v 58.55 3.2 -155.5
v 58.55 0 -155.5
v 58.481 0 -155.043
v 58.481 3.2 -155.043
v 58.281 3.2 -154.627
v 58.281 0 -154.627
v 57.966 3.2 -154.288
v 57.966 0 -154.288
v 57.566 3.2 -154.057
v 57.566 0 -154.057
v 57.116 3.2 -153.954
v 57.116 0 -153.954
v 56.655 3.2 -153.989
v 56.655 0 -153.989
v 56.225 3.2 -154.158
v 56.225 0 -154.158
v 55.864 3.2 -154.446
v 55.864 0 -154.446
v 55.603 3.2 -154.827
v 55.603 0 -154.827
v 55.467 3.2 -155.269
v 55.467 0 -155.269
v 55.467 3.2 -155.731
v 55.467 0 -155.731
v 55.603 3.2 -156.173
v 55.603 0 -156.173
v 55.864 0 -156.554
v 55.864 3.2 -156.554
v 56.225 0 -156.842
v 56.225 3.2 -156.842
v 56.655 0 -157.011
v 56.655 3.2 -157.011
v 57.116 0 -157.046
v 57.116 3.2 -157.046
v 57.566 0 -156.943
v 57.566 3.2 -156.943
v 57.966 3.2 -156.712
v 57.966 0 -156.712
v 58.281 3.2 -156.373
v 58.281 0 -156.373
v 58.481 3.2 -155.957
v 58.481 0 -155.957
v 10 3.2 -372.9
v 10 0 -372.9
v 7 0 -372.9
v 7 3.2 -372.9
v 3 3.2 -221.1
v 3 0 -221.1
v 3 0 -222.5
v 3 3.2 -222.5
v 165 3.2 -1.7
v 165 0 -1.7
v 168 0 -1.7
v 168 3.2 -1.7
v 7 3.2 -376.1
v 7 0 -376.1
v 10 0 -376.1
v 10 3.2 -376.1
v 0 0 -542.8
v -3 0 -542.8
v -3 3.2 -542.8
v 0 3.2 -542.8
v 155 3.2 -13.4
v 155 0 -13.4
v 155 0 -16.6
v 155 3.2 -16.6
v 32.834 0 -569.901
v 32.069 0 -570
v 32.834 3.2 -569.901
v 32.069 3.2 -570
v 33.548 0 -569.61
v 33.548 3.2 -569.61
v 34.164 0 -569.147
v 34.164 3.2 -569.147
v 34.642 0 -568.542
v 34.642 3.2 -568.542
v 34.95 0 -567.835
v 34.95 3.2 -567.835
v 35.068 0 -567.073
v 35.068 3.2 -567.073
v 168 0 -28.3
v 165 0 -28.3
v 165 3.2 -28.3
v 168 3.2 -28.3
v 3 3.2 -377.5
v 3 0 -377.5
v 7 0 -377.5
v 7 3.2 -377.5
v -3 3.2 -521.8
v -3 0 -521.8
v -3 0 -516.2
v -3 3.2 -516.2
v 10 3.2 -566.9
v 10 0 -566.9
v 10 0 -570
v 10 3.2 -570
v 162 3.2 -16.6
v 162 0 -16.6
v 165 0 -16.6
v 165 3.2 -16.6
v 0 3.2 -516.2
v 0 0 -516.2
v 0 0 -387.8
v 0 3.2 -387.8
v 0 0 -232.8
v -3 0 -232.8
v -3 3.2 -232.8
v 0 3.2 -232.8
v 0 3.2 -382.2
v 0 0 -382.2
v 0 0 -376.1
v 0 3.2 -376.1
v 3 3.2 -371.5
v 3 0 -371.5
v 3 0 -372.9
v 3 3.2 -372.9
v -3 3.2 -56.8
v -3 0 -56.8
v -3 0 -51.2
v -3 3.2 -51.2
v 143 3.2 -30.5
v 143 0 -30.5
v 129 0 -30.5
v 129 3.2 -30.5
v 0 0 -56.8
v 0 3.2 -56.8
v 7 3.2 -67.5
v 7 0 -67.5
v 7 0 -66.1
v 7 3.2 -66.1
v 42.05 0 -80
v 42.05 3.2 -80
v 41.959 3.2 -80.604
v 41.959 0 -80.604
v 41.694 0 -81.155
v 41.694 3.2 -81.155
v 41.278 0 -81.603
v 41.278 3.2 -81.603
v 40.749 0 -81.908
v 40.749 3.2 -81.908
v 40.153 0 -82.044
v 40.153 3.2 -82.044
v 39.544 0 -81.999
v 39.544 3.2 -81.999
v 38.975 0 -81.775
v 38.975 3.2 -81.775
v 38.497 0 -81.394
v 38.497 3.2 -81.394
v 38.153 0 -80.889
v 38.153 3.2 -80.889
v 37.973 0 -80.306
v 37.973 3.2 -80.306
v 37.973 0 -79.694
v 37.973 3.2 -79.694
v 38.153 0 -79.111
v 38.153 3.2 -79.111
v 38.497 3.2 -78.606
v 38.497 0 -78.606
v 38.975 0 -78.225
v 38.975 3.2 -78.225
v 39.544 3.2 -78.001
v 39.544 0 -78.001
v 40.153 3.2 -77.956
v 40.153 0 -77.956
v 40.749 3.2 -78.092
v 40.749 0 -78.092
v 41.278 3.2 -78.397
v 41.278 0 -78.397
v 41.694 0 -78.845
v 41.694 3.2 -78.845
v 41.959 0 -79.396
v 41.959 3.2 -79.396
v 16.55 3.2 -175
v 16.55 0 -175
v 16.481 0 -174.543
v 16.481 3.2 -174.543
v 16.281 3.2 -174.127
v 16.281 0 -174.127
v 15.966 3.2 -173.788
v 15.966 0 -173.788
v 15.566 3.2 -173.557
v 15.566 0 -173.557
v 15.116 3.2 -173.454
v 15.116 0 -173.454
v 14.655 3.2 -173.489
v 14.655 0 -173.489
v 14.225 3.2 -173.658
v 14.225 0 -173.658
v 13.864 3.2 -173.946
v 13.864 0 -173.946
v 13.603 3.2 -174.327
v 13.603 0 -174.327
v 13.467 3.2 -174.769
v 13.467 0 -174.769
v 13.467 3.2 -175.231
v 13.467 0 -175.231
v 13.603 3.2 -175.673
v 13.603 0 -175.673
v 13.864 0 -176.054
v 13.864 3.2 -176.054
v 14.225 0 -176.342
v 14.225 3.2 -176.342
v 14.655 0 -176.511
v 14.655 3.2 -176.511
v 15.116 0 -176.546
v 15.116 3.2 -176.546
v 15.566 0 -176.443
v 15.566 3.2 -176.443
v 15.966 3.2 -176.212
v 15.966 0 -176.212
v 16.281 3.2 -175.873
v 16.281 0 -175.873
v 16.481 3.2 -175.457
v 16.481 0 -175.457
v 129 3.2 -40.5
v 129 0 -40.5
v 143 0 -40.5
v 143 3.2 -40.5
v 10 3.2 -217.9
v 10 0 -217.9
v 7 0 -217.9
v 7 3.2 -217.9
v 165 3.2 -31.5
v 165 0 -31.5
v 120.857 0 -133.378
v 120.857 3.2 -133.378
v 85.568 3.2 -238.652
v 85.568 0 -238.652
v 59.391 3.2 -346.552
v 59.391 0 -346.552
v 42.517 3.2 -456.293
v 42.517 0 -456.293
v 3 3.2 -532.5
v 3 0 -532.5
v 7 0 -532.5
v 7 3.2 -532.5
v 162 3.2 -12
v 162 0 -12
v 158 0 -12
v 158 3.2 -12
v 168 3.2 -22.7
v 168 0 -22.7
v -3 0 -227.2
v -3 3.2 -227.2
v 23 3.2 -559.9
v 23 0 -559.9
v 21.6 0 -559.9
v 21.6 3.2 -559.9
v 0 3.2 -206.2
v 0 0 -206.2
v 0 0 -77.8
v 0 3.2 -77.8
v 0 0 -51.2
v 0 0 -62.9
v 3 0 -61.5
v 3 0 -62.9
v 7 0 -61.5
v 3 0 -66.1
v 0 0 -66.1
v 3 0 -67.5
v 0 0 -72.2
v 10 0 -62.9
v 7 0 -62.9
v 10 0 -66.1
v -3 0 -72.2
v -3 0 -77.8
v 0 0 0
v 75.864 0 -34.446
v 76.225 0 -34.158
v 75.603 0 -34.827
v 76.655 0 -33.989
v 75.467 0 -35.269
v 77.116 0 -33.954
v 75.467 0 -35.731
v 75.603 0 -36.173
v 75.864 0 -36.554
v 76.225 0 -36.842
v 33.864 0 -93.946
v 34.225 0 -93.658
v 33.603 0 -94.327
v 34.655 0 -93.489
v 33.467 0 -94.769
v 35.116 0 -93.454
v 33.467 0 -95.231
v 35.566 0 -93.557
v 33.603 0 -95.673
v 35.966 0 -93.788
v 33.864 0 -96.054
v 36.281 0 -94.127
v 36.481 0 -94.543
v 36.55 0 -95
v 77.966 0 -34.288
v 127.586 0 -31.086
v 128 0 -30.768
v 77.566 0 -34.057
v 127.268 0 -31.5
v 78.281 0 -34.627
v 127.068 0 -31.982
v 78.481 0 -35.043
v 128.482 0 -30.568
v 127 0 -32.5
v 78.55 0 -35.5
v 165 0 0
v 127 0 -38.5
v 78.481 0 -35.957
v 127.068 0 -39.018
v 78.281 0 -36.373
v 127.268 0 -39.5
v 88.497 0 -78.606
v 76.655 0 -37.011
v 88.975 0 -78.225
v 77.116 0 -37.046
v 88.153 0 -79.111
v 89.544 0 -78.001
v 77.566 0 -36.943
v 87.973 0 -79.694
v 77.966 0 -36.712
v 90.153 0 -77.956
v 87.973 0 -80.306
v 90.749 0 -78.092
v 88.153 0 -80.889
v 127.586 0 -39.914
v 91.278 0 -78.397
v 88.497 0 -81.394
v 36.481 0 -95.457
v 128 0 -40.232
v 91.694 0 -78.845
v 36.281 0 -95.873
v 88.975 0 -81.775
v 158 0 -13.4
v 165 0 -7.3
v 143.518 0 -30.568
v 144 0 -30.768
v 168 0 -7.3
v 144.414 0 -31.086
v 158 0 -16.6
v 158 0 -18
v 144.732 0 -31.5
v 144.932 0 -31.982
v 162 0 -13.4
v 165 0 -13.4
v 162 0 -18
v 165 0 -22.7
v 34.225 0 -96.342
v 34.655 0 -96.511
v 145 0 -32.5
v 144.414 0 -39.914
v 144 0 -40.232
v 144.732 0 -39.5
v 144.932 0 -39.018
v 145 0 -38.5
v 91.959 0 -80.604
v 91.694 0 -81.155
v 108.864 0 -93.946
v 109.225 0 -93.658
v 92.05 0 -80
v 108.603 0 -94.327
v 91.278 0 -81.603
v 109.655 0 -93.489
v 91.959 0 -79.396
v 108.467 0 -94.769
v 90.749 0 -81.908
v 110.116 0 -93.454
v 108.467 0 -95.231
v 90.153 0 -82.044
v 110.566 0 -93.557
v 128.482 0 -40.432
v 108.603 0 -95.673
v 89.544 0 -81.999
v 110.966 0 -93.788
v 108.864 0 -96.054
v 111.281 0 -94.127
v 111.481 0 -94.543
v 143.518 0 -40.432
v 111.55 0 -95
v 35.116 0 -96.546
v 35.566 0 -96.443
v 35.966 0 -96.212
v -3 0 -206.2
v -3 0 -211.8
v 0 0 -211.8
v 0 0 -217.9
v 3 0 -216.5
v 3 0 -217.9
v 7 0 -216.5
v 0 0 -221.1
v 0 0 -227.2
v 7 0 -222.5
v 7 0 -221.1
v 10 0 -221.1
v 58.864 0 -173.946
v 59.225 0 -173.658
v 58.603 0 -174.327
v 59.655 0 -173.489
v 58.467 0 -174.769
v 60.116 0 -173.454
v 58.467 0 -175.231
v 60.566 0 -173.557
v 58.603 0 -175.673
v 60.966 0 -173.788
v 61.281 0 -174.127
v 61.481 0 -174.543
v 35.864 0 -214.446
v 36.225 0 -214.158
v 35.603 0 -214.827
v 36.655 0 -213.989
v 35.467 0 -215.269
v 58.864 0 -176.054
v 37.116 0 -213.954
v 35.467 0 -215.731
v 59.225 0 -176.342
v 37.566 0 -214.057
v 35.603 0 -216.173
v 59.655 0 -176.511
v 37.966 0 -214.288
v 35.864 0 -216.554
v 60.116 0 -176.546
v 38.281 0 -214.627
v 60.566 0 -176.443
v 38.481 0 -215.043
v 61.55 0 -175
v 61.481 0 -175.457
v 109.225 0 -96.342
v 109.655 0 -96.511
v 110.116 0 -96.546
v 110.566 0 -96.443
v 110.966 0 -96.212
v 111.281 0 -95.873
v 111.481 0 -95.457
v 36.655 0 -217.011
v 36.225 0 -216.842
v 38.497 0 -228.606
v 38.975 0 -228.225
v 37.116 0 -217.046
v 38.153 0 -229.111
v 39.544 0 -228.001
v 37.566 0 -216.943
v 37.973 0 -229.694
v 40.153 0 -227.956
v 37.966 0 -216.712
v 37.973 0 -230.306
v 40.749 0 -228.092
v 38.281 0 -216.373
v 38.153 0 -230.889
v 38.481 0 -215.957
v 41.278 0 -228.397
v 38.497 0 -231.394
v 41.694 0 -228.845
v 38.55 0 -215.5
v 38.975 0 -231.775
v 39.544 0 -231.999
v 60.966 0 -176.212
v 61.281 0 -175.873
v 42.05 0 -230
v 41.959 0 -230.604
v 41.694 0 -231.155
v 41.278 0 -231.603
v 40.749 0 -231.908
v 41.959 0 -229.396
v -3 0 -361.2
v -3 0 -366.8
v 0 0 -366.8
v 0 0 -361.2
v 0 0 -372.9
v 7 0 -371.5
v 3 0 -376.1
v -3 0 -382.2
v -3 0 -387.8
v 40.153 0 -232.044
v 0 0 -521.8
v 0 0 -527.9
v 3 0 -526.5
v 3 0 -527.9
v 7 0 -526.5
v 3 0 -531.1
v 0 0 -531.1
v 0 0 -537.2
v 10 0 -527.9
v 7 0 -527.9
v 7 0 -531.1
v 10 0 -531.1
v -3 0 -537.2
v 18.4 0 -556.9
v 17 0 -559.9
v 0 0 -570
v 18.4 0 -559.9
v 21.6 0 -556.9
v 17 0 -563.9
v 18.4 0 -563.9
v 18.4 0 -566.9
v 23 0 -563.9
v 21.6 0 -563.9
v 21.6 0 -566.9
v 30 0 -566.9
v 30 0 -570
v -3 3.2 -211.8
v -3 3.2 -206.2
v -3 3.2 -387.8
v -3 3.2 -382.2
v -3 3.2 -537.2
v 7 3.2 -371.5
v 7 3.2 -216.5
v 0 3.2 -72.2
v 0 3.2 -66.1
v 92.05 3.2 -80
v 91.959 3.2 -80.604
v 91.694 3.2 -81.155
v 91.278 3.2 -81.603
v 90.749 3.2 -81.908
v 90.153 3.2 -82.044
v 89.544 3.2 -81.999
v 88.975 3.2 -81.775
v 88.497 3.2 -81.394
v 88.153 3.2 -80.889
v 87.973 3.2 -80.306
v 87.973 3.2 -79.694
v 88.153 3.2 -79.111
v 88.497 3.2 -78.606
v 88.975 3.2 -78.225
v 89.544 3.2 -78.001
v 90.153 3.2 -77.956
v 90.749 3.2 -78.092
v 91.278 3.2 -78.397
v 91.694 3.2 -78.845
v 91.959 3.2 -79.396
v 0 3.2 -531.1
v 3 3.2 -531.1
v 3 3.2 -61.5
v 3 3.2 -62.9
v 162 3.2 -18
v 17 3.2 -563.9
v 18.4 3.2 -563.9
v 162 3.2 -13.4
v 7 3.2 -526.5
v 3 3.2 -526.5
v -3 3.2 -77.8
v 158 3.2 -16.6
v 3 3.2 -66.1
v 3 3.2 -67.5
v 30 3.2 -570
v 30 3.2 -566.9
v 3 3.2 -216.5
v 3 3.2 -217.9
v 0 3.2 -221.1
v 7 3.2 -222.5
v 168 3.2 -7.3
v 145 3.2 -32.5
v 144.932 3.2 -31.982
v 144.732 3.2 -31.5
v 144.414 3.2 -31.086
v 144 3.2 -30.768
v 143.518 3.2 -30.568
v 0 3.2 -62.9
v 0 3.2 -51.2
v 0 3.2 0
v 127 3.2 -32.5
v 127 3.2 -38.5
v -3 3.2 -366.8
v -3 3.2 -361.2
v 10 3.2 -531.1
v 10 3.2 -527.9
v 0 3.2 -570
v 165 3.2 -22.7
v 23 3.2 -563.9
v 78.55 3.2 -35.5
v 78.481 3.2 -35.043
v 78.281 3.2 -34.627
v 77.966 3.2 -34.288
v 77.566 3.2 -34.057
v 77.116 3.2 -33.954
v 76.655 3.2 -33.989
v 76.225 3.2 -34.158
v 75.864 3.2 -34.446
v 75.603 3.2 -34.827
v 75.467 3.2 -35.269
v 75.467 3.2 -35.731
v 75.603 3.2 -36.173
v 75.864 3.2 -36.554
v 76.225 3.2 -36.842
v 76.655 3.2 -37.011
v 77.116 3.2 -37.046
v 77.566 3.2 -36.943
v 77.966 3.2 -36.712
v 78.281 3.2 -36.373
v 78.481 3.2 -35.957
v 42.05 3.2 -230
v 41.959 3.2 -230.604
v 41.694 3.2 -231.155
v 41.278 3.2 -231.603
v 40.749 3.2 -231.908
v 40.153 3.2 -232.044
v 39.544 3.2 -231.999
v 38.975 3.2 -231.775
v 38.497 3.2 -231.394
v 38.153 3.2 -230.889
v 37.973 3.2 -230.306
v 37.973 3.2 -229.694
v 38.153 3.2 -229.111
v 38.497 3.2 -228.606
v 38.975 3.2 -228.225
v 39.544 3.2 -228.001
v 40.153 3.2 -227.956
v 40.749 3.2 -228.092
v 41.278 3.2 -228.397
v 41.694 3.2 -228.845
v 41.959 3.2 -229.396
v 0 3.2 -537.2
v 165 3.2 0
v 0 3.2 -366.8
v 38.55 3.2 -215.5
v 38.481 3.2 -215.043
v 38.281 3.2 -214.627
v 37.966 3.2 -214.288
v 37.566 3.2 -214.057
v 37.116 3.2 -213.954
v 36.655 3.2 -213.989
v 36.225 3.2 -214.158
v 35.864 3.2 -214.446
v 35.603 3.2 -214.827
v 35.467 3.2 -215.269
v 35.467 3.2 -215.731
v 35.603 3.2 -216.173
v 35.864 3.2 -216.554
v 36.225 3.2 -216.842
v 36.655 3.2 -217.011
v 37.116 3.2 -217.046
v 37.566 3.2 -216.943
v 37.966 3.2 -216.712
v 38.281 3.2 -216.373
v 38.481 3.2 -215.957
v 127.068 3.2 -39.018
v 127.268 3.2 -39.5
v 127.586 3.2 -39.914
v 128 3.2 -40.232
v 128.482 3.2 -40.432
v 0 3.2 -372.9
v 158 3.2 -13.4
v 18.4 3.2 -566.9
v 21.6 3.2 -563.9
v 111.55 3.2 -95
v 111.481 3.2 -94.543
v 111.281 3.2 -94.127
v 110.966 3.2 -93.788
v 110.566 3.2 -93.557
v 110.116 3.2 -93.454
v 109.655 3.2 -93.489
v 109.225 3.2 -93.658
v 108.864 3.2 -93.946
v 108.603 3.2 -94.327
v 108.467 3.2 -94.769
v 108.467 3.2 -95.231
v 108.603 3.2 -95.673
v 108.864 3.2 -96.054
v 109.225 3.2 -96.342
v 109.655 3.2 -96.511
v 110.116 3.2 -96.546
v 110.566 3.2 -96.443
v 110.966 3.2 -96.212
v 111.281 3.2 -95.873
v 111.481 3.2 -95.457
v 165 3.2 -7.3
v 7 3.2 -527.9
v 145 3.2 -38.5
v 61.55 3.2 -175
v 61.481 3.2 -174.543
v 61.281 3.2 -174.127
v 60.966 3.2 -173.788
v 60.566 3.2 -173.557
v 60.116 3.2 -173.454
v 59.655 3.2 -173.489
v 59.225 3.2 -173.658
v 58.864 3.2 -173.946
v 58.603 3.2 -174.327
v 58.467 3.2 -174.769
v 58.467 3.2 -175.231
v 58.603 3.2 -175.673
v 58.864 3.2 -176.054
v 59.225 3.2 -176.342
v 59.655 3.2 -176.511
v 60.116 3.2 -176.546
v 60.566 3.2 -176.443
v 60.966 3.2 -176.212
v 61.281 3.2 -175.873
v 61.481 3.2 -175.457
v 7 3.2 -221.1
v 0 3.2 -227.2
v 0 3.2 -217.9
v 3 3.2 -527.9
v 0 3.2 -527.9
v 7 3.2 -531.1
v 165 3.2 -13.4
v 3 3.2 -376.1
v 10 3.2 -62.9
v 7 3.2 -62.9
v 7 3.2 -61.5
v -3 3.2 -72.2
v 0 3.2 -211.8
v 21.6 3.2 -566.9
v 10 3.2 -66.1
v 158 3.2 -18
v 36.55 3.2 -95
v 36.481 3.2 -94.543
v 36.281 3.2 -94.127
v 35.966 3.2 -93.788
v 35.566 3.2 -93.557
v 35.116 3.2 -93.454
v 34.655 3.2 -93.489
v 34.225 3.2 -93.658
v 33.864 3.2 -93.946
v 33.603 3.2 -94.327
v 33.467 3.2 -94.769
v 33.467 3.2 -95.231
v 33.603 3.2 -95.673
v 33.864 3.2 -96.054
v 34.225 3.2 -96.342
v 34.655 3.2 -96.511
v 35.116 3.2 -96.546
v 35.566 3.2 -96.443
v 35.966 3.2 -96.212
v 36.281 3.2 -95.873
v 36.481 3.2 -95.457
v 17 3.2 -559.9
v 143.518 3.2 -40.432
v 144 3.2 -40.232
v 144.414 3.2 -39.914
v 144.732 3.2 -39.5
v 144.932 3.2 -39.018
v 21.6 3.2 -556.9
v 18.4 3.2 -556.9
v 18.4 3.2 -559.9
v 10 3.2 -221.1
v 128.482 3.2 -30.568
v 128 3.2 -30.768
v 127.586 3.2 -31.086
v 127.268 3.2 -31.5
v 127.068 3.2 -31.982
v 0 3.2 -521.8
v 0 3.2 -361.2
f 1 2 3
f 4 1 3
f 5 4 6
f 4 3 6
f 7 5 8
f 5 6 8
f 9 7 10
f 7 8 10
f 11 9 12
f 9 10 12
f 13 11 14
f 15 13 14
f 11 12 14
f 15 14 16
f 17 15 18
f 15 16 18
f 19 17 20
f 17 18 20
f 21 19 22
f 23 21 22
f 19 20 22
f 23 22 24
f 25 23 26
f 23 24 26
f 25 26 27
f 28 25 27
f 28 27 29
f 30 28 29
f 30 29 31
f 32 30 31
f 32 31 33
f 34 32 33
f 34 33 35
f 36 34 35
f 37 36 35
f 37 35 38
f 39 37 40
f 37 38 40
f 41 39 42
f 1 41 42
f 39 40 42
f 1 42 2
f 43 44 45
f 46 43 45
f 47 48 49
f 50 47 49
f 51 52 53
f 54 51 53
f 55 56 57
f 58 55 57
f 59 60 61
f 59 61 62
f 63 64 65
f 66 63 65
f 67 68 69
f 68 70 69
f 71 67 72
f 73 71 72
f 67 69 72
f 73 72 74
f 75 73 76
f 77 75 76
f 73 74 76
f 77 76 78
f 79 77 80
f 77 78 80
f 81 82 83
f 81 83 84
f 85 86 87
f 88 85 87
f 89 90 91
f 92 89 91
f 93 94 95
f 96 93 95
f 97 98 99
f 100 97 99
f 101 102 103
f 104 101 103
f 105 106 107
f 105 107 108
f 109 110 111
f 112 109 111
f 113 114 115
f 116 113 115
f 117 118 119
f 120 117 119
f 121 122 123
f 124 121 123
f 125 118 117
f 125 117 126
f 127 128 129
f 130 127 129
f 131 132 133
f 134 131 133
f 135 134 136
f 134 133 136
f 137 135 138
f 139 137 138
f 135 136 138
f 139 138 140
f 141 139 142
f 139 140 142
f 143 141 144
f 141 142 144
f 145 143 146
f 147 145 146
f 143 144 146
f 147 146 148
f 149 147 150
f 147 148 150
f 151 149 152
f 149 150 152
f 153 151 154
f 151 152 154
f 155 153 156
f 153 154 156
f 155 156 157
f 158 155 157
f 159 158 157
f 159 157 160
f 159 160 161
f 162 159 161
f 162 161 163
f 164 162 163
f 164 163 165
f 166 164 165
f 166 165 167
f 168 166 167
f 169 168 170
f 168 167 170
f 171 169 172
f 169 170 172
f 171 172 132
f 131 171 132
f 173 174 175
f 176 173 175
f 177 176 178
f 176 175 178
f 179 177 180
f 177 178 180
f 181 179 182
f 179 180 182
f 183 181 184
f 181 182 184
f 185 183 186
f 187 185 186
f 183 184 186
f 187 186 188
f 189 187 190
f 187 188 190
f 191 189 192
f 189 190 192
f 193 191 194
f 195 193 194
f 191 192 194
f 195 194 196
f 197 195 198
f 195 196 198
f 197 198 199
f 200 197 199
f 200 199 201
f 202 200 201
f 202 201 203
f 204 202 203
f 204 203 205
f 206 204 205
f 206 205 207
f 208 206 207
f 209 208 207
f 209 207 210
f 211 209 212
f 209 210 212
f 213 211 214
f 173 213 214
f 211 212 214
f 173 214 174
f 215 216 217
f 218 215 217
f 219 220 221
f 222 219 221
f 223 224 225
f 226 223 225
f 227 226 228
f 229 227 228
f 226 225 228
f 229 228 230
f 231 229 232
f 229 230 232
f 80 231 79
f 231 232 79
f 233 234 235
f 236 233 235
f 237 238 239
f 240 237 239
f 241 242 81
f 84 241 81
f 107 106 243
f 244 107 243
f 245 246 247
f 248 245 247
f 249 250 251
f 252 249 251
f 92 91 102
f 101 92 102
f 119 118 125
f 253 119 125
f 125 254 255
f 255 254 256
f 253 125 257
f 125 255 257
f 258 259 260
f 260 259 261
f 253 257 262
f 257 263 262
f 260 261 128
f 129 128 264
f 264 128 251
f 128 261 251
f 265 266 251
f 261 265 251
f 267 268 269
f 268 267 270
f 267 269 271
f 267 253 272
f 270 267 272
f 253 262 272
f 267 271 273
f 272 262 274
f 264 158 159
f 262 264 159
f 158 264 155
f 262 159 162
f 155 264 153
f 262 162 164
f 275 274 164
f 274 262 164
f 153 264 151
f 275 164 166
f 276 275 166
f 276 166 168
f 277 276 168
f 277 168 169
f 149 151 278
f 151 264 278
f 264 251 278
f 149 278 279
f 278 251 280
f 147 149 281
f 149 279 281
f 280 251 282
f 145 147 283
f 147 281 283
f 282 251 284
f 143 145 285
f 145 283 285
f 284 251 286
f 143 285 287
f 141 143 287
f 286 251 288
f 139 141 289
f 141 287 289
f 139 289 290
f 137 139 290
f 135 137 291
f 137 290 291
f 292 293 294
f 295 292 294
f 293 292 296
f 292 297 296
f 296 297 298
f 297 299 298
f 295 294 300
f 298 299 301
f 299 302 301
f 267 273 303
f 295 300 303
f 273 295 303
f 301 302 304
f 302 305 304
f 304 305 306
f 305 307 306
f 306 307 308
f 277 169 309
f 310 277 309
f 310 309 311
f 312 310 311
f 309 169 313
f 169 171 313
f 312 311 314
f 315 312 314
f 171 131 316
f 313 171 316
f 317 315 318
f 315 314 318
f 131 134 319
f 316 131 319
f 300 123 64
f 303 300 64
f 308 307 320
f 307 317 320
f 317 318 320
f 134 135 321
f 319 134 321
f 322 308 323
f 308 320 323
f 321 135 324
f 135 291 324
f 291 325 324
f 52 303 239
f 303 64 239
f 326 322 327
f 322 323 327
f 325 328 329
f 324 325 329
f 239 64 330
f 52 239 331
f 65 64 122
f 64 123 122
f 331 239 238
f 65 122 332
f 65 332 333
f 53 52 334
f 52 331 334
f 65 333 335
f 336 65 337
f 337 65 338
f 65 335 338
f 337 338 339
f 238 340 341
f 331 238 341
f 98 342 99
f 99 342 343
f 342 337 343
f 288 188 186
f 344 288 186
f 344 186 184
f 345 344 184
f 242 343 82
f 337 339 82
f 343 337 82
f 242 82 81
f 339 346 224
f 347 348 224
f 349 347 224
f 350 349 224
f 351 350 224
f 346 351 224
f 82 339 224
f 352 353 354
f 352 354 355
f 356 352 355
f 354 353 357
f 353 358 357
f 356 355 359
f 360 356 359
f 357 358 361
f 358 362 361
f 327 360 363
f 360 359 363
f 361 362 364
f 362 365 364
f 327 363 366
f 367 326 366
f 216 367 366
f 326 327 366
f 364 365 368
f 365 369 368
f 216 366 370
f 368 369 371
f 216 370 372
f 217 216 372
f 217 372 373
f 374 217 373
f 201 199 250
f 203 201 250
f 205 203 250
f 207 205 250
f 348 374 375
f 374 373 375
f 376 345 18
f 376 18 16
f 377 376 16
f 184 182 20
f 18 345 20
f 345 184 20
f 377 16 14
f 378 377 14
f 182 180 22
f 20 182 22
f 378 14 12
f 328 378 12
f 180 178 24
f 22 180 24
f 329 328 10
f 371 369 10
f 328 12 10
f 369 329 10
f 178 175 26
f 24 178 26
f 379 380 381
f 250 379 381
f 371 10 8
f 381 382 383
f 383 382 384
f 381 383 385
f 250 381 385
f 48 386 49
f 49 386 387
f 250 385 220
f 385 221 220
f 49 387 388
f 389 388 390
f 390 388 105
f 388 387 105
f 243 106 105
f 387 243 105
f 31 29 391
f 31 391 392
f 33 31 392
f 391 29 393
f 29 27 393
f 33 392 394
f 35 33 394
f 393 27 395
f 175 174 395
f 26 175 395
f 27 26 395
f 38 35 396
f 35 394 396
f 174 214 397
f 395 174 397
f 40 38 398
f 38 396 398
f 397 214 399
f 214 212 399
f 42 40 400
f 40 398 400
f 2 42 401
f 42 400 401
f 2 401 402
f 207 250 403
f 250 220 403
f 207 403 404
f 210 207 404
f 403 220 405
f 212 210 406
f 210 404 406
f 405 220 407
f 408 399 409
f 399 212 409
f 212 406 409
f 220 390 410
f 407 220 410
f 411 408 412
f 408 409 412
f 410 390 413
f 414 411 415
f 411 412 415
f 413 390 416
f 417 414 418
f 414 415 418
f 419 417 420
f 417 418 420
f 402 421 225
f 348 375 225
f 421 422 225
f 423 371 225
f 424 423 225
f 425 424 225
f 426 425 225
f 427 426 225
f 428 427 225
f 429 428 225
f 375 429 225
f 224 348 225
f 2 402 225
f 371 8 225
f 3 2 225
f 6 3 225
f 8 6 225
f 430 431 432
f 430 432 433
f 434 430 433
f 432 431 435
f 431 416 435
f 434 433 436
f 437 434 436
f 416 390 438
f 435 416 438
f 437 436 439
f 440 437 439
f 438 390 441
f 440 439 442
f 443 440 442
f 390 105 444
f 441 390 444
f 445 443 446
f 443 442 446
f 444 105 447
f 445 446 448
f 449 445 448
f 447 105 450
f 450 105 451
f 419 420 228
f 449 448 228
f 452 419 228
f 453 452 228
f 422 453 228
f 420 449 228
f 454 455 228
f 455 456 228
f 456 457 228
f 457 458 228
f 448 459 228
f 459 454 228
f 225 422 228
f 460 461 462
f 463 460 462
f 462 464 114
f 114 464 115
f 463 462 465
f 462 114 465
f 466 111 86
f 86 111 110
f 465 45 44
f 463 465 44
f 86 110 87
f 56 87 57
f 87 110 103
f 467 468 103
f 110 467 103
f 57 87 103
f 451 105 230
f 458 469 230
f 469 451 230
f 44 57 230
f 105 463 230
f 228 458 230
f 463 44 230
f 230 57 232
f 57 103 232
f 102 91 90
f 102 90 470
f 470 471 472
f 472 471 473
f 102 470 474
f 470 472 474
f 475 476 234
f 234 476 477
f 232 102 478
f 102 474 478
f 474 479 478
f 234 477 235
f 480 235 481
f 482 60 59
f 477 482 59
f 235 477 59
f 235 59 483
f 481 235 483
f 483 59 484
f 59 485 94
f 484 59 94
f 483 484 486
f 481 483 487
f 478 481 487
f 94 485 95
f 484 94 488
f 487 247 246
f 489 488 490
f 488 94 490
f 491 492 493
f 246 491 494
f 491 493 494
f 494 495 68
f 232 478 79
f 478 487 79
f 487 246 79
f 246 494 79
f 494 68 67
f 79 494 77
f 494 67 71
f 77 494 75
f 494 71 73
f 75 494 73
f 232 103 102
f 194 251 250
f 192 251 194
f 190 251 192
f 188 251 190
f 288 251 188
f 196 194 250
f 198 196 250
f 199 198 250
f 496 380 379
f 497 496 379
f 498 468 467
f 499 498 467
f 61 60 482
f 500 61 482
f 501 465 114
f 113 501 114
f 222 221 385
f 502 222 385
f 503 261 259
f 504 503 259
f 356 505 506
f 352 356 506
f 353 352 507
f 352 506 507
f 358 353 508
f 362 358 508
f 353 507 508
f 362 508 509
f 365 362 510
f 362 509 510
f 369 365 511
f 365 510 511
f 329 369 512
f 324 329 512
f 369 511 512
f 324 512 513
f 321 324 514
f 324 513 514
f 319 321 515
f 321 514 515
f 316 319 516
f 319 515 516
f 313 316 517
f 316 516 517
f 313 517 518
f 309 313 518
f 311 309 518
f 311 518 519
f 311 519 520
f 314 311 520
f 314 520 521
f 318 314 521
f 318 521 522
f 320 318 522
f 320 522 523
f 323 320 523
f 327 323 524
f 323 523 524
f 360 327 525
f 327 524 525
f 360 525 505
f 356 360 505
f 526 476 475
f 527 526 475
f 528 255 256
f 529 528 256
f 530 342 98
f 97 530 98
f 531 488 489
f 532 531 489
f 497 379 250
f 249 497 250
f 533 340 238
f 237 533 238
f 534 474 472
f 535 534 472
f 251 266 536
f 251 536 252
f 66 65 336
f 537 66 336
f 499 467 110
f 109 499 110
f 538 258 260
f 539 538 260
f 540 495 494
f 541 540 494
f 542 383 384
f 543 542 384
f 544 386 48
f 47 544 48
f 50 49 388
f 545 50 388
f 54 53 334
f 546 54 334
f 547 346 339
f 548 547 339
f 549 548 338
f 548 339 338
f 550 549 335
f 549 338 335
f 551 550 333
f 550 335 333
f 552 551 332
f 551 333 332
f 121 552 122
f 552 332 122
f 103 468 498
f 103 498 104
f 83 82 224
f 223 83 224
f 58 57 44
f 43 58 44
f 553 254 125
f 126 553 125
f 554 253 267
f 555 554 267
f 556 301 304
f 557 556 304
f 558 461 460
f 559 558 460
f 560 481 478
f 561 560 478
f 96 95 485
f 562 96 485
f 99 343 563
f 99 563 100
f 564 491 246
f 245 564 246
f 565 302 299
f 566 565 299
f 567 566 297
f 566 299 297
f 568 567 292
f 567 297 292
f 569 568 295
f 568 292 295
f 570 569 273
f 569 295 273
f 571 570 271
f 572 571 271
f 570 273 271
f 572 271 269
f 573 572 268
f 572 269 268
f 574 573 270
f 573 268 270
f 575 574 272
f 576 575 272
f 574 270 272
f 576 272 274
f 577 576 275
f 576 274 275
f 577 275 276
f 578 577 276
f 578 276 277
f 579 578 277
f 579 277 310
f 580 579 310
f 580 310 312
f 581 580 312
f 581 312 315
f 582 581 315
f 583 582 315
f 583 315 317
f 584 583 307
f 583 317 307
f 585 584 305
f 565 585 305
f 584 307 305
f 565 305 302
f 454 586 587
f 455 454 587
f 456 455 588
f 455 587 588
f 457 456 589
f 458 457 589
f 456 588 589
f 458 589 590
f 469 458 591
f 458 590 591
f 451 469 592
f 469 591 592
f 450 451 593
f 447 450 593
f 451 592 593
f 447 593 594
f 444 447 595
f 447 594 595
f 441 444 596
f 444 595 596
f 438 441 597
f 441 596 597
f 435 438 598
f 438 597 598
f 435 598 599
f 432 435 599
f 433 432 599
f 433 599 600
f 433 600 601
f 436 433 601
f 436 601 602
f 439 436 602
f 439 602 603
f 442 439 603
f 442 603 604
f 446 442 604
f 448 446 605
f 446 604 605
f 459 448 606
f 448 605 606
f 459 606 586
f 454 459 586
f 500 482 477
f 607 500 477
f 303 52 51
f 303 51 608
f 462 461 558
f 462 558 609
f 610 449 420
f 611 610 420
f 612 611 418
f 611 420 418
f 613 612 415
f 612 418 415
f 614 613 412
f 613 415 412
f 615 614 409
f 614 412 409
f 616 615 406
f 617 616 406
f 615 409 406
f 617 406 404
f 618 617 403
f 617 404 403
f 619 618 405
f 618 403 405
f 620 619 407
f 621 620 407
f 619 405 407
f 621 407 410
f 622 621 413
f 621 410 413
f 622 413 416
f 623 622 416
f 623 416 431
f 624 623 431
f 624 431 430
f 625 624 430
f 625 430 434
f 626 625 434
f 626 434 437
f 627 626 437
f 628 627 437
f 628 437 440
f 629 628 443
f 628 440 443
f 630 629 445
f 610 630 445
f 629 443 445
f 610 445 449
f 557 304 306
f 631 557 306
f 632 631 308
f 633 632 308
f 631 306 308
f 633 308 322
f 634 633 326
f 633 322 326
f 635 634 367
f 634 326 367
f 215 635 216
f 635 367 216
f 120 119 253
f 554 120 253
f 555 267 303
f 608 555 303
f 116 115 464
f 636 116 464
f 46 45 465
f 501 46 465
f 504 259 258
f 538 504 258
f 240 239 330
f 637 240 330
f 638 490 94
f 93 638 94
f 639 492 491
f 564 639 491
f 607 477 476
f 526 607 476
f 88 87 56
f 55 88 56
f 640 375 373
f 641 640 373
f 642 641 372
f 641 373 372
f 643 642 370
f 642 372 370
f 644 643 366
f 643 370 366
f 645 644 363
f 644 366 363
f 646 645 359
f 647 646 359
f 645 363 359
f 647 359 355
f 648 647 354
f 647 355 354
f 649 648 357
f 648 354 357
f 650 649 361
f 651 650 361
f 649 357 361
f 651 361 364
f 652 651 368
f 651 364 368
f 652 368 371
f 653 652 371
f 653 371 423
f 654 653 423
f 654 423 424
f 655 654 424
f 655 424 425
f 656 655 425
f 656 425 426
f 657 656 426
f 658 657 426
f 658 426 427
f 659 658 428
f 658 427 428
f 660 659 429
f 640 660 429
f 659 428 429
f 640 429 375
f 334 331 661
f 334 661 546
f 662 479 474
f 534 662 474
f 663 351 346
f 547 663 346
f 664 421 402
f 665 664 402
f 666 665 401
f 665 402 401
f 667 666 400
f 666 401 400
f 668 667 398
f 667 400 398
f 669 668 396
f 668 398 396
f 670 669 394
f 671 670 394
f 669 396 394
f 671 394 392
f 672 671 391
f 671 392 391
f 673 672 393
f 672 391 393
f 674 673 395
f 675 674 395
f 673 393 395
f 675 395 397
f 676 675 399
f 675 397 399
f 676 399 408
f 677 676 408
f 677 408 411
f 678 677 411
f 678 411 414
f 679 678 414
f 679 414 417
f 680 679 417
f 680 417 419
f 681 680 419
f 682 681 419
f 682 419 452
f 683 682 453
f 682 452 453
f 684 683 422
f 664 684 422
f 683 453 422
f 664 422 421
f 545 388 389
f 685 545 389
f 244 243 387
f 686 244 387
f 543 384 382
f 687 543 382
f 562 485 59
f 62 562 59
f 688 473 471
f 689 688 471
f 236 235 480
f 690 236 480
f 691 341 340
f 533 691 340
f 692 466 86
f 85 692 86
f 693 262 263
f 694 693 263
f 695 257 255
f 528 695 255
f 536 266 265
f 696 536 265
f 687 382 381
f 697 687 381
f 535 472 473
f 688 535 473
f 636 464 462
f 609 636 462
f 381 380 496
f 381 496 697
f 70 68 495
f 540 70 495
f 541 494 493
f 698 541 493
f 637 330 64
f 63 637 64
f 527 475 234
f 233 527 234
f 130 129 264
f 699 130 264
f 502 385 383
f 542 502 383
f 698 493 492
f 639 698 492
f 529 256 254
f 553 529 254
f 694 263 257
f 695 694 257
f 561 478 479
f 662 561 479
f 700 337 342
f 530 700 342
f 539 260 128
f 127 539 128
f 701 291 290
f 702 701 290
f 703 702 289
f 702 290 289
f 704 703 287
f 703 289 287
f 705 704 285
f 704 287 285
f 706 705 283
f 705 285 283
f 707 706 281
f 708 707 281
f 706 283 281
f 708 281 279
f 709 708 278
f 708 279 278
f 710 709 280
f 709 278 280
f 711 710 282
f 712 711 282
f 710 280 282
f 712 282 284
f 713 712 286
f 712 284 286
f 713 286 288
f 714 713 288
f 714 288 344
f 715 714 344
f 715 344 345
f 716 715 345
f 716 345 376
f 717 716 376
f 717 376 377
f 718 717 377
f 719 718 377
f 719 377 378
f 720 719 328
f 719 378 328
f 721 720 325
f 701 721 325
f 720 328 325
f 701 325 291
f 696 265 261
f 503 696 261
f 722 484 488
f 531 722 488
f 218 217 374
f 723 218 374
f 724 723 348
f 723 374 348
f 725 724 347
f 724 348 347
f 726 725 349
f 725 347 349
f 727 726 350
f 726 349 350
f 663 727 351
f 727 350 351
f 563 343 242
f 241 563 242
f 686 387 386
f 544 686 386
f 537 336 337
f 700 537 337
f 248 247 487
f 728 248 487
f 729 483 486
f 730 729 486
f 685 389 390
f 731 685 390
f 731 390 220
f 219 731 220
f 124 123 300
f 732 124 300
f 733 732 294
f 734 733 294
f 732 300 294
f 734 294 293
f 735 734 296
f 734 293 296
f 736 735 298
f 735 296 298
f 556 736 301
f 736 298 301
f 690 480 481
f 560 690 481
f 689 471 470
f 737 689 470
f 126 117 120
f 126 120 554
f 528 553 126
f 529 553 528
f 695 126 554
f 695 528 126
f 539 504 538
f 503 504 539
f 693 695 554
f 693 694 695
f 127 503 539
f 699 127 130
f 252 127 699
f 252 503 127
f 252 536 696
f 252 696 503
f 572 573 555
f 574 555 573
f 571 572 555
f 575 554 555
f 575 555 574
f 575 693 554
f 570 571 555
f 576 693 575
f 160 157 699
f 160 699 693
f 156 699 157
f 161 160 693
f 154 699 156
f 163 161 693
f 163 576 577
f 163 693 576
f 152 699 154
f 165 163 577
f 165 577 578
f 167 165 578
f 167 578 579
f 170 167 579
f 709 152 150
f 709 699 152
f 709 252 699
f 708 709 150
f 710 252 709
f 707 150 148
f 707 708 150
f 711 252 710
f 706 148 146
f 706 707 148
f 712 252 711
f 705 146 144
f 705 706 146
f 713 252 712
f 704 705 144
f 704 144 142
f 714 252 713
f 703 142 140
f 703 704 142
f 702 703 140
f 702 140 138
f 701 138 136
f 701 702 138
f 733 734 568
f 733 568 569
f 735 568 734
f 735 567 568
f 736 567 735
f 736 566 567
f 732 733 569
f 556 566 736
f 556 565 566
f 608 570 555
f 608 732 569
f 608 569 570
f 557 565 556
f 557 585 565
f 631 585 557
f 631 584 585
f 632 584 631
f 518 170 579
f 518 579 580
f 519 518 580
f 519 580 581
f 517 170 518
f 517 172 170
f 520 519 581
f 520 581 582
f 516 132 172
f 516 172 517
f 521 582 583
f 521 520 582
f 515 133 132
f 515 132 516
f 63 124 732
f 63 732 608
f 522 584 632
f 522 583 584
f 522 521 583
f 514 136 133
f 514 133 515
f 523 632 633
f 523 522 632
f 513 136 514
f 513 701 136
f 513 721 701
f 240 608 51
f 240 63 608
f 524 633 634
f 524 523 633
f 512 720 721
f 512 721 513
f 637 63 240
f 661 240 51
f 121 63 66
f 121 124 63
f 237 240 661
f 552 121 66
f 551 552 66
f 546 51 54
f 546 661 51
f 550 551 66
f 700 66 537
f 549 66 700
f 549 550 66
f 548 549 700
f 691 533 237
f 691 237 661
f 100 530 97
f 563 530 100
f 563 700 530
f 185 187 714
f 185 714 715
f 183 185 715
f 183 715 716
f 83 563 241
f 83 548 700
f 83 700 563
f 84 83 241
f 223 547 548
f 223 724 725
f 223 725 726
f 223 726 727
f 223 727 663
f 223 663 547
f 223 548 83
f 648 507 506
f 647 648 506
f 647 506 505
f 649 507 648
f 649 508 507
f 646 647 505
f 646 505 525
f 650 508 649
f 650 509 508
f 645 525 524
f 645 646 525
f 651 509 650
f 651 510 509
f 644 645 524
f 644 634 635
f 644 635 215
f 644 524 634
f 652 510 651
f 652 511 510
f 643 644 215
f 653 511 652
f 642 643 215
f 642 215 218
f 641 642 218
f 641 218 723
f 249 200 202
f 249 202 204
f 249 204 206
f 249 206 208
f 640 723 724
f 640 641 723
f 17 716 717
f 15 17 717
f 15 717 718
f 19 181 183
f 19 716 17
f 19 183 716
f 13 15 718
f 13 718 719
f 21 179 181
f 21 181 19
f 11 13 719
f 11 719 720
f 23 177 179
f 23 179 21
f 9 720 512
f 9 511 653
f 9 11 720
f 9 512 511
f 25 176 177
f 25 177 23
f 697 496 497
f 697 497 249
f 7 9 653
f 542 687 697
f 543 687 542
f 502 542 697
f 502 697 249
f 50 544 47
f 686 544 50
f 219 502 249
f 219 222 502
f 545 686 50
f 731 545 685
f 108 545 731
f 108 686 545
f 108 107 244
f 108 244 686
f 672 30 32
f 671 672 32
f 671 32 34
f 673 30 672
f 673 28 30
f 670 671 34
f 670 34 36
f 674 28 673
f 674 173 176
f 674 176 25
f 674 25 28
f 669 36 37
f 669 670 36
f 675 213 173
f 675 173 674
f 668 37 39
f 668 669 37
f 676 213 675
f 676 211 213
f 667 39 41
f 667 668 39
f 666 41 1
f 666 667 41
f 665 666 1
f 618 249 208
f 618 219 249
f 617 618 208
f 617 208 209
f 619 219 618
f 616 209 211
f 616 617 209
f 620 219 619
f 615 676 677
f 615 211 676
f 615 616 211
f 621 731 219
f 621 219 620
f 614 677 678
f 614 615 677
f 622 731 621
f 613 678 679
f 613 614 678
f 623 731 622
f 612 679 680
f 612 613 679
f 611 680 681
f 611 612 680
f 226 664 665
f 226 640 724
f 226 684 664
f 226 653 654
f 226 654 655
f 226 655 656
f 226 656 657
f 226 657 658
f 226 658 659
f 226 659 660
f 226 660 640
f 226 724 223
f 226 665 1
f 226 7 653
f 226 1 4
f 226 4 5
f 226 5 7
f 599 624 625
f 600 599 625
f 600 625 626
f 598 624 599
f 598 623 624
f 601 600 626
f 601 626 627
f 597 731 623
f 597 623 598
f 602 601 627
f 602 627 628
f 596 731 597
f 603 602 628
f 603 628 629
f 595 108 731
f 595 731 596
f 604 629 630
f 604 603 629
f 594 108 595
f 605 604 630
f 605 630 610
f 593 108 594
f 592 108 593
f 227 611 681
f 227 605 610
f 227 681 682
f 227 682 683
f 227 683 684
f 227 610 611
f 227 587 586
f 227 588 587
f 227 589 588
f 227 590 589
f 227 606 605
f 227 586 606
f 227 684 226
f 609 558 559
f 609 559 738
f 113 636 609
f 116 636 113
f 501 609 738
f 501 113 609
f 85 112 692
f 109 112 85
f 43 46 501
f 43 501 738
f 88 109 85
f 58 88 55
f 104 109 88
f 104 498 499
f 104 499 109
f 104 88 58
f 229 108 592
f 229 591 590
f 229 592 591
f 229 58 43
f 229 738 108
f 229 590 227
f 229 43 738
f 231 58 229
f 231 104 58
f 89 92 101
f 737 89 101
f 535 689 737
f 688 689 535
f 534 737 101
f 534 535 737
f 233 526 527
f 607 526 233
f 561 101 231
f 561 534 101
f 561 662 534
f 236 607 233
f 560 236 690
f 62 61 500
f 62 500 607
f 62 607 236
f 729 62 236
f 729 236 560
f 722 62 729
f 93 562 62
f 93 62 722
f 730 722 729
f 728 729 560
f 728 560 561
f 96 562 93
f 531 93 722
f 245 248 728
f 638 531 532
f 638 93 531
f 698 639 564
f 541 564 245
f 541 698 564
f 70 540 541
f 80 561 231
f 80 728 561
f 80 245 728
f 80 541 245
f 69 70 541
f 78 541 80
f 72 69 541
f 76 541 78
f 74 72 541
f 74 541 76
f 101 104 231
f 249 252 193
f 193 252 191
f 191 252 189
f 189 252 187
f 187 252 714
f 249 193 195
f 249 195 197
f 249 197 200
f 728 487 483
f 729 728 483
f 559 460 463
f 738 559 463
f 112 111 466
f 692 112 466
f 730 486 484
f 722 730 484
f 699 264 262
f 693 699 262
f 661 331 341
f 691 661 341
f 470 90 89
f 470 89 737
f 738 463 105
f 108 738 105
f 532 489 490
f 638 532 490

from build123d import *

# Parameters (mm, degrees)
SALIENTE_EXTRUIR1_DEPTH = 3.2
CROQUIS3_R              = 2.05
CORTAR_EXTRUIR2_DEPTH   = 3.2
CORTAR_EXTRUIR3_DEPTH   = 3.2
CORTAR_EXTRUIR4_DEPTH   = 3.2
REDONDEO1_R             = 3
CROQUIS6_R              = 1.55
CORTAR_EXTRUIR5_DEPTH   = 3.2
CROQUIS7_W              = 3
CROQUIS7_H              = 0.2
CORTAR_EXTRUIR6_DEPTH   = 3.2


with BuildPart() as part:
    # Croquis1 → Saliente-Extruir1 (new body)
    with BuildSketch(Plane(origin=(0, 0, 0), x_dir=(1, 0, 0), z_dir=(0, 1, 0))):
        Polygon((7, 66.1), (10, 66.1), (10, 62.9), (7, 62.9), (7, 61.5), (3, 61.5), (3, 62.9), (0, 62.9), (0, 57), (-3, 57), (-3, 51), (0, 51), (0, 0), (165, 0), (165, 1.5), (168, 1.5), (168, 7.5), (165, 7.5), (165, 13.4), (162, 13.4), (162, 12), (158, 12), (158, 13.4), (155, 13.4), (155, 16.6), (158, 16.6), (158, 18), (162, 18), (162, 16.6), (165, 16.6), (165, 22.5), (168, 22.5), (168, 28.5), (165, 28.5), (165, 570), (30, 570), (30, 566.9), (21.6, 566.9), (21.6, 563.9), (23, 563.9), (23, 559.9), (21.6, 559.9), (21.6, 556.9), (18.4, 556.9), (18.4, 559.9), (17, 559.9), (17, 563.9), (18.4, 563.9), (18.4, 566.9), (10, 566.9), (10, 570), (0, 570), (0, 543), (-3, 543), (-3, 537), (0, 537), (0, 531.1), (3, 531.1), (3, 532.5), (7, 532.5), (7, 531.1), (10, 531.1), (10, 527.9), (7, 527.9), (7, 526.5), (3, 526.5), (3, 527.9), (0, 527.9), (0, 522), (-3, 522), (-3, 516), (0, 516), (0, 388), (-3, 388), (-3, 382), (0, 382), (0, 376.1), (3, 376.1), (3, 377.5), (7, 377.5), (7, 376.1), (10, 376.1), (10, 372.9), (7, 372.9), (7, 371.5), (3, 371.5), (3, 372.9), (0, 372.9), (0, 367), (-3, 367), (-3, 361), (0, 361), (0, 233), (-3, 233), (-3, 227), (0, 227), (0, 221.1), (3, 221.1), (3, 222.5), (7, 222.5), (7, 221.1), (10, 221.1), (10, 217.9), (7, 217.9), (7, 216.5), (3, 216.5), (3, 217.9), (0, 217.9), (0, 212), (-3, 212), (-3, 206), (0, 206), (0, 78), (-3, 78), (-3, 72), (0, 72), (0, 66.1), (3, 66.1), (3, 67.5), (7, 67.5), align=None)
    extrude(amount=SALIENTE_EXTRUIR1_DEPTH)

    # Croquis3 → Cortar-Extruir2 (cut)
    with BuildSketch(Plane(origin=(0, 3.2, 0), x_dir=(1, 0, 0), z_dir=(0, 1, 0))):
        with Locations((40, 80)):
            Circle(CROQUIS3_R)
        with Locations((90, 80)):
            Circle(CROQUIS3_R)
        with Locations((40, 230)):
            Circle(CROQUIS3_R)
    extrude(amount=-CORTAR_EXTRUIR2_DEPTH, mode=Mode.SUBTRACT)

    # Croquis4 → Cortar-Extruir3 (cut)
    with BuildSketch(Plane.XZ):
        with BuildLine():
            Line((143, -30.5), (129, -30.5))
            ThreePointArc((129, -30.5), (127.585786438, -31.085786438), (127, -32.5))
            Line((127, -32.5), (127, -38.5))
            ThreePointArc((127, -38.5), (127.585786438, -39.914213562), (129, -40.5))
            Line((129, -40.5), (143, -40.5))
            ThreePointArc((143, -40.5), (144.414213562, -39.914213562), (145, -38.5))
            Line((145, -38.5), (145, -32.5))
            ThreePointArc((145, -32.5), (144.414213562, -31.085786438), (143, -30.5))
        make_face()
    extrude(amount=-CORTAR_EXTRUIR3_DEPTH, mode=Mode.SUBTRACT)

    # Croquis5 → Cortar-Extruir4 (cut)
    with BuildSketch(Plane.XZ):
        with BuildLine():
            Line((35, -570), (165, -570))
            Line((165, -570), (165, -31.5))
            ThreePointArc((165, -31.5), (70.982951471, -293.744955787), (35, -570))
        make_face()
    extrude(amount=-CORTAR_EXTRUIR4_DEPTH, mode=Mode.SUBTRACT)

    # Redondeo1
    redondeo1_edges = [part.edges().sort_by_distance(p)[0] for p in [
        (35, 1.6, -570),
    ]]
    fillet(redondeo1_edges, radius=REDONDEO1_R)

    # Croquis6 → Cortar-Extruir5 (cut)
    with BuildSketch(Plane.XZ):
        with Locations((110, -95)):
            Circle(CROQUIS6_R)
        with Locations((35, -95)):
            Circle(CROQUIS6_R)
        with Locations((60, -175)):
            Circle(CROQUIS6_R)
        with Locations((15, -175)):
            Circle(CROQUIS6_R)
        with Locations((77, -35.5)):
            Circle(CROQUIS6_R)
        with Locations((37, -215.5)):
            Circle(CROQUIS6_R)
        with Locations((57, -155.5)):
            Circle(CROQUIS6_R)
    extrude(amount=-CORTAR_EXTRUIR5_DEPTH, mode=Mode.SUBTRACT)

    # Croquis7 → Cortar-Extruir6 (cut)
    with BuildSketch(Plane.XZ):
        with Locations((-1.5, -542.9)):
            Rectangle(CROQUIS7_W, CROQUIS7_H)
        with Locations((-1.5, -537.1)):
            Rectangle(CROQUIS7_W, CROQUIS7_H)
        with Locations((-1.5, -521.9)):
            Rectangle(CROQUIS7_W, CROQUIS7_H)
        with Locations((-1.5, -516.1)):
            Rectangle(CROQUIS7_W, CROQUIS7_H)
        with Locations((-1.5, -387.9)):
            Rectangle(CROQUIS7_W, CROQUIS7_H)
        with Locations((-1.5, -382.1)):
            Rectangle(CROQUIS7_W, CROQUIS7_H)
        with Locations((-1.5, -366.9)):
            Rectangle(CROQUIS7_W, CROQUIS7_H)
        with Locations((-1.5, -361.1)):
            Rectangle(CROQUIS7_W, CROQUIS7_H)
        with Locations((-1.5, -232.9)):
            Rectangle(CROQUIS7_W, CROQUIS7_H)
        with Locations((-1.5, -227.1)):
            Rectangle(CROQUIS7_W, CROQUIS7_H)
        with Locations((-1.5, -211.9)):
            Rectangle(CROQUIS7_W, CROQUIS7_H)
        with Locations((-1.5, -206.1)):
            Rectangle(CROQUIS7_W, CROQUIS7_H)
        with Locations((-1.5, -77.9)):
            Rectangle(CROQUIS7_W, CROQUIS7_H)
        with Locations((-1.5, -72.1)):
            Rectangle(CROQUIS7_W, CROQUIS7_H)
        with Locations((-1.5, -51.1)):
            Rectangle(CROQUIS7_W, CROQUIS7_H)
        with Locations((-1.5, -56.9)):
            Rectangle(CROQUIS7_W, CROQUIS7_H)
        with Locations((166.5, -28.4)):
            Rectangle(CROQUIS7_W, CROQUIS7_H)
        with Locations((166.5, -22.6)):
            Rectangle(CROQUIS7_W, CROQUIS7_H)
        with Locations((166.5, -7.4)):
            Rectangle(CROQUIS7_W, CROQUIS7_H)
        with Locations((166.5, -1.6)):
            Rectangle(CROQUIS7_W, CROQUIS7_H)
    extrude(amount=-CORTAR_EXTRUIR6_DEPTH, mode=Mode.SUBTRACT)


solid = part.part
